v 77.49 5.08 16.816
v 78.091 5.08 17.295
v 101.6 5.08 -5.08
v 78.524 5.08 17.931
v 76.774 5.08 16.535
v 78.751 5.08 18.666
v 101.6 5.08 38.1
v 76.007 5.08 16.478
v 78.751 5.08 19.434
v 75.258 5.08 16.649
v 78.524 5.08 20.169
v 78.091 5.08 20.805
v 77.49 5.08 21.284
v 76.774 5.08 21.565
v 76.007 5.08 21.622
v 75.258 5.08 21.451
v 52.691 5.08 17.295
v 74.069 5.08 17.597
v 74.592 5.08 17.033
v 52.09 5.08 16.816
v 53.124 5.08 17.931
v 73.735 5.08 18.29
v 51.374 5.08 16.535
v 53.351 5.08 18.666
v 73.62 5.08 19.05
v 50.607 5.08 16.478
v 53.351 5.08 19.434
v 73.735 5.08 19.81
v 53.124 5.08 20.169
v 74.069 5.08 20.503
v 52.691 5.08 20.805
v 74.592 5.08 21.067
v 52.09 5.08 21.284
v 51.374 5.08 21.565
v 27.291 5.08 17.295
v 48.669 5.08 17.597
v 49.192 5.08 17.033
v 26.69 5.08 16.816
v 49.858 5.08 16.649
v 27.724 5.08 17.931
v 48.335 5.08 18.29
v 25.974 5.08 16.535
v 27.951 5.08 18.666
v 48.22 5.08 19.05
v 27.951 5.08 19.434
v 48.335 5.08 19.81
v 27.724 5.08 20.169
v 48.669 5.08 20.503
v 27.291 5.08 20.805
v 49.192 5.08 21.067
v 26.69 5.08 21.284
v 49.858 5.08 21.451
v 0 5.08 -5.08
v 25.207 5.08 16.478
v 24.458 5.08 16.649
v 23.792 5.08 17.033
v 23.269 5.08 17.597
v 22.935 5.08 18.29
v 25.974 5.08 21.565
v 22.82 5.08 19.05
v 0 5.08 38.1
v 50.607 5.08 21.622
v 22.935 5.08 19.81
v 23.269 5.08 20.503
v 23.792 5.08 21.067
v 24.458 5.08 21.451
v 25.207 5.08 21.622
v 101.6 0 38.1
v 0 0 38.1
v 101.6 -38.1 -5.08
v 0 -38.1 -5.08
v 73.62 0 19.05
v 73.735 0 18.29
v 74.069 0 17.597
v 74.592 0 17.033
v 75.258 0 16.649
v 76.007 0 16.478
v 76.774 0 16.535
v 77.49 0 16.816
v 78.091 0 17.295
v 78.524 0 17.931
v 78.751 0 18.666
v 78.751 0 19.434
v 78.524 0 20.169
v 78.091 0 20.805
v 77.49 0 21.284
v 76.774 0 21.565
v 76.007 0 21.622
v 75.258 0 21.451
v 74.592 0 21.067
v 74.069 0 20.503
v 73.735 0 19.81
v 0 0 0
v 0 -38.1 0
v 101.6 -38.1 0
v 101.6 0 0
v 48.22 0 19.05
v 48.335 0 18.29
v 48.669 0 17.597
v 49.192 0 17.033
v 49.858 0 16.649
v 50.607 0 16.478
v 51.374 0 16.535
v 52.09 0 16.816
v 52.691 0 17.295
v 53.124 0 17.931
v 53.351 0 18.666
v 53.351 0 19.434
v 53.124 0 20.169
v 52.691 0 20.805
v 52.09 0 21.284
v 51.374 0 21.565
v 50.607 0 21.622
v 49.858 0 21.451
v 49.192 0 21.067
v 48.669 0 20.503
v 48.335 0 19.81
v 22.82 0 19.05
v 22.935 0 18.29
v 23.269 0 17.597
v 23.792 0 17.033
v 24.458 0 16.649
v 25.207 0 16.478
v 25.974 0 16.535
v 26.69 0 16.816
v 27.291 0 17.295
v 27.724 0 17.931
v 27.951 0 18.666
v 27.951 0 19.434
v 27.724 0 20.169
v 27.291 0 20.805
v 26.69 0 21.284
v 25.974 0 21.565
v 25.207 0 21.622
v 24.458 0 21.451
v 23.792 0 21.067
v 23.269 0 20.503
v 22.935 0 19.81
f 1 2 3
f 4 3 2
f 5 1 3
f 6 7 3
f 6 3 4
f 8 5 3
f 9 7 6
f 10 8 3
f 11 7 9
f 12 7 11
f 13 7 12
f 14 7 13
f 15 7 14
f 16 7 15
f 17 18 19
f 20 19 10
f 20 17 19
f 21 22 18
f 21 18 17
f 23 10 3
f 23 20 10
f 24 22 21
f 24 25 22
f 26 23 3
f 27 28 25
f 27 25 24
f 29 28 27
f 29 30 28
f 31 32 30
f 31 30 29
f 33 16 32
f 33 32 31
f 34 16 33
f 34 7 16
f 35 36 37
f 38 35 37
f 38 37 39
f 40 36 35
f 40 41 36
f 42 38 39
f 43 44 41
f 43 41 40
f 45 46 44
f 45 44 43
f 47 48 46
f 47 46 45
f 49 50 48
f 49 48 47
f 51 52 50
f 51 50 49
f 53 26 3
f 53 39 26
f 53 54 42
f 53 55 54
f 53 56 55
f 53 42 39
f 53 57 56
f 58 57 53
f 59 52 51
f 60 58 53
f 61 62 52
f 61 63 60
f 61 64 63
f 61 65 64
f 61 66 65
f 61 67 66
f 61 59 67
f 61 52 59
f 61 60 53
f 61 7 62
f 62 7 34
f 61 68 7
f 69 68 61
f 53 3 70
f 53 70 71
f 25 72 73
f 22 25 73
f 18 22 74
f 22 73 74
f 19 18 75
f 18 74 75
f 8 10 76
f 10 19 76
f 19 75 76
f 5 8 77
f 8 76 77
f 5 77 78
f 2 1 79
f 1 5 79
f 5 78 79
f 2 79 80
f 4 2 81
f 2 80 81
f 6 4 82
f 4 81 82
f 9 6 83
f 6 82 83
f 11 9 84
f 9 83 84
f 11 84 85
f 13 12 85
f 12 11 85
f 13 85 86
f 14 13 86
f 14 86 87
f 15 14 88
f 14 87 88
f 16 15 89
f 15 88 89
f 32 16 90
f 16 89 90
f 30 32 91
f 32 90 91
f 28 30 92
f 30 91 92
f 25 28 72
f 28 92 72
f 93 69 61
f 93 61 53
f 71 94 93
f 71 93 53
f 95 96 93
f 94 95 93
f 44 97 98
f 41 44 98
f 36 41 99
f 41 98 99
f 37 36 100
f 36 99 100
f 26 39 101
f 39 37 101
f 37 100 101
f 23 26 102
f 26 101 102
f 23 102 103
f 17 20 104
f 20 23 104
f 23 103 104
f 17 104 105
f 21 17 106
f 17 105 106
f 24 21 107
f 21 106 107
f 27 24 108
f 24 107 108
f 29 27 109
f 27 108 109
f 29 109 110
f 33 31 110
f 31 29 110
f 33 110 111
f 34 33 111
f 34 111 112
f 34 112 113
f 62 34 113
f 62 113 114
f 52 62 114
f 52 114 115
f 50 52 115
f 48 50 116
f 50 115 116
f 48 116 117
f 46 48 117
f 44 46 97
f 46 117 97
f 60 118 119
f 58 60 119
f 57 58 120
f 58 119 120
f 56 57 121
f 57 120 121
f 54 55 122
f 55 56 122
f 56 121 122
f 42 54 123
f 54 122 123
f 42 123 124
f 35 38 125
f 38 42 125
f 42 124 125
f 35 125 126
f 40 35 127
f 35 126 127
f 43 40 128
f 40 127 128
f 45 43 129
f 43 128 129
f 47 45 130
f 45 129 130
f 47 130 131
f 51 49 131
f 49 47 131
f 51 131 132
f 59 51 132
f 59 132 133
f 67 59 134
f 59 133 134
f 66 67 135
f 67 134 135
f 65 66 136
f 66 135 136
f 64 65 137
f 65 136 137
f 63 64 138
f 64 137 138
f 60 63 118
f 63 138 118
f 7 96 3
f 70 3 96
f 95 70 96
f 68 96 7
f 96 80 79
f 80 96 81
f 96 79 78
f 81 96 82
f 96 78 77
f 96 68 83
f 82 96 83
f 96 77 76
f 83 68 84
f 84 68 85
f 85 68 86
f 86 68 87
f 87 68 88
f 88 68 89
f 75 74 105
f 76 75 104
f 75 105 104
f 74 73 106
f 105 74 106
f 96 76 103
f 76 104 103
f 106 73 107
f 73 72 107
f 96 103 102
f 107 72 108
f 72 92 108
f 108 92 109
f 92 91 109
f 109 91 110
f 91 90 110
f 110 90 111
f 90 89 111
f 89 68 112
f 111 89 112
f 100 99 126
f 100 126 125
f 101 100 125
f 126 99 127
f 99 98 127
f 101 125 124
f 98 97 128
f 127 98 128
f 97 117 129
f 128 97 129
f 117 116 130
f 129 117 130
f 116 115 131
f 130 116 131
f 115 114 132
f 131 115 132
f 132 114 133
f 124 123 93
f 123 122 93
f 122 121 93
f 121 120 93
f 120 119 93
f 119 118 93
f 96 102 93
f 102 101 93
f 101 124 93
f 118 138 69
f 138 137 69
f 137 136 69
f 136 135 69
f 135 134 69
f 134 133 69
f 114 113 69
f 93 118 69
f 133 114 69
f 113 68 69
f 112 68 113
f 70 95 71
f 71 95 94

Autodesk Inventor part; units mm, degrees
ref_plane "YZ Plane" through (0, 0, 0) normal (1, 0, 0) x (0, 1, 0)
ref_plane "XZ Plane" through (0, 0, 0) normal (0, 1, 0) x (-1, 0, 0)
ref_plane "XY Plane" through (0, 0, 0) normal (0, 0, 1) x (1, 0, 0)
sketch "Sketch1" plane through (0, 0, 0) normal (0, 1, 0) x (-1, 0, 0)
  line L0 (0, 0) -> (-101.6, 0)
  line L1 (-101.6, 0) -> (-101.6, 38.1)
  line L2 (-101.6, 38.1) -> (0, 38.1)
  line L3 (0, 38.1) -> (0, 0)
  line L4 (0, 19.05) -> (-101.6, 19.05) construction
  line L5 (0, 9.2781) -> (-25.4, 9.2781) construction
  line L6 (-25.4, 9.2781) -> (-50.8, 9.2781) construction
  line L7 (-50.8, 9.2781) -> (-76.2, 9.2781) construction
  line L8 (-76.2, 9.2781) -> (-101.6, 9.2781) construction
  line L9 (-101.6, 9.2781) -> (-101.6, 9.2781) construction
  circle A0 centre (-25.4, 19.05) radius 2.5797
  circle A1 centre (-50.8, 19.05) radius 2.5797
  circle A2 centre (-76.2, 19.05) radius 2.5797
  dimension "d0" = 101.6
  dimension "d1" = 38.1
  dimension "d2" = 25.4
  dimension "d3" = 25.4
  dimension "d4" = 25.4
  dimension "d5" = 25.4
  dimension "d6" = 5.1594
  dimension "d7" = 5.1594
  dimension "d8" = 5.1594
extrude "Extrusion1" add sketch "Sketch1" along normal blind 5.08
sketch "Sketch2" plane through (101.6, 0, 0) normal (0, 0, -1) x (-1, 0, 0)
  line L0 (0, 5.08) -> (101.6, 5.08) projected
  line L1 (101.6, 5.08) -> (0, 5.08)
  line L2 (0, 5.08) -> (0, -38.1)
  line L3 (0, -38.1) -> (101.6, -38.1)
  line L4 (101.6, -38.1) -> (101.6, 5.08)
  point P0 (101.6, 0)
  dimension "d11" = 43.18
extrude "Extrusion2" add sketch "Sketch2" along normal blind 5.08
properties part number "jig proto1"
